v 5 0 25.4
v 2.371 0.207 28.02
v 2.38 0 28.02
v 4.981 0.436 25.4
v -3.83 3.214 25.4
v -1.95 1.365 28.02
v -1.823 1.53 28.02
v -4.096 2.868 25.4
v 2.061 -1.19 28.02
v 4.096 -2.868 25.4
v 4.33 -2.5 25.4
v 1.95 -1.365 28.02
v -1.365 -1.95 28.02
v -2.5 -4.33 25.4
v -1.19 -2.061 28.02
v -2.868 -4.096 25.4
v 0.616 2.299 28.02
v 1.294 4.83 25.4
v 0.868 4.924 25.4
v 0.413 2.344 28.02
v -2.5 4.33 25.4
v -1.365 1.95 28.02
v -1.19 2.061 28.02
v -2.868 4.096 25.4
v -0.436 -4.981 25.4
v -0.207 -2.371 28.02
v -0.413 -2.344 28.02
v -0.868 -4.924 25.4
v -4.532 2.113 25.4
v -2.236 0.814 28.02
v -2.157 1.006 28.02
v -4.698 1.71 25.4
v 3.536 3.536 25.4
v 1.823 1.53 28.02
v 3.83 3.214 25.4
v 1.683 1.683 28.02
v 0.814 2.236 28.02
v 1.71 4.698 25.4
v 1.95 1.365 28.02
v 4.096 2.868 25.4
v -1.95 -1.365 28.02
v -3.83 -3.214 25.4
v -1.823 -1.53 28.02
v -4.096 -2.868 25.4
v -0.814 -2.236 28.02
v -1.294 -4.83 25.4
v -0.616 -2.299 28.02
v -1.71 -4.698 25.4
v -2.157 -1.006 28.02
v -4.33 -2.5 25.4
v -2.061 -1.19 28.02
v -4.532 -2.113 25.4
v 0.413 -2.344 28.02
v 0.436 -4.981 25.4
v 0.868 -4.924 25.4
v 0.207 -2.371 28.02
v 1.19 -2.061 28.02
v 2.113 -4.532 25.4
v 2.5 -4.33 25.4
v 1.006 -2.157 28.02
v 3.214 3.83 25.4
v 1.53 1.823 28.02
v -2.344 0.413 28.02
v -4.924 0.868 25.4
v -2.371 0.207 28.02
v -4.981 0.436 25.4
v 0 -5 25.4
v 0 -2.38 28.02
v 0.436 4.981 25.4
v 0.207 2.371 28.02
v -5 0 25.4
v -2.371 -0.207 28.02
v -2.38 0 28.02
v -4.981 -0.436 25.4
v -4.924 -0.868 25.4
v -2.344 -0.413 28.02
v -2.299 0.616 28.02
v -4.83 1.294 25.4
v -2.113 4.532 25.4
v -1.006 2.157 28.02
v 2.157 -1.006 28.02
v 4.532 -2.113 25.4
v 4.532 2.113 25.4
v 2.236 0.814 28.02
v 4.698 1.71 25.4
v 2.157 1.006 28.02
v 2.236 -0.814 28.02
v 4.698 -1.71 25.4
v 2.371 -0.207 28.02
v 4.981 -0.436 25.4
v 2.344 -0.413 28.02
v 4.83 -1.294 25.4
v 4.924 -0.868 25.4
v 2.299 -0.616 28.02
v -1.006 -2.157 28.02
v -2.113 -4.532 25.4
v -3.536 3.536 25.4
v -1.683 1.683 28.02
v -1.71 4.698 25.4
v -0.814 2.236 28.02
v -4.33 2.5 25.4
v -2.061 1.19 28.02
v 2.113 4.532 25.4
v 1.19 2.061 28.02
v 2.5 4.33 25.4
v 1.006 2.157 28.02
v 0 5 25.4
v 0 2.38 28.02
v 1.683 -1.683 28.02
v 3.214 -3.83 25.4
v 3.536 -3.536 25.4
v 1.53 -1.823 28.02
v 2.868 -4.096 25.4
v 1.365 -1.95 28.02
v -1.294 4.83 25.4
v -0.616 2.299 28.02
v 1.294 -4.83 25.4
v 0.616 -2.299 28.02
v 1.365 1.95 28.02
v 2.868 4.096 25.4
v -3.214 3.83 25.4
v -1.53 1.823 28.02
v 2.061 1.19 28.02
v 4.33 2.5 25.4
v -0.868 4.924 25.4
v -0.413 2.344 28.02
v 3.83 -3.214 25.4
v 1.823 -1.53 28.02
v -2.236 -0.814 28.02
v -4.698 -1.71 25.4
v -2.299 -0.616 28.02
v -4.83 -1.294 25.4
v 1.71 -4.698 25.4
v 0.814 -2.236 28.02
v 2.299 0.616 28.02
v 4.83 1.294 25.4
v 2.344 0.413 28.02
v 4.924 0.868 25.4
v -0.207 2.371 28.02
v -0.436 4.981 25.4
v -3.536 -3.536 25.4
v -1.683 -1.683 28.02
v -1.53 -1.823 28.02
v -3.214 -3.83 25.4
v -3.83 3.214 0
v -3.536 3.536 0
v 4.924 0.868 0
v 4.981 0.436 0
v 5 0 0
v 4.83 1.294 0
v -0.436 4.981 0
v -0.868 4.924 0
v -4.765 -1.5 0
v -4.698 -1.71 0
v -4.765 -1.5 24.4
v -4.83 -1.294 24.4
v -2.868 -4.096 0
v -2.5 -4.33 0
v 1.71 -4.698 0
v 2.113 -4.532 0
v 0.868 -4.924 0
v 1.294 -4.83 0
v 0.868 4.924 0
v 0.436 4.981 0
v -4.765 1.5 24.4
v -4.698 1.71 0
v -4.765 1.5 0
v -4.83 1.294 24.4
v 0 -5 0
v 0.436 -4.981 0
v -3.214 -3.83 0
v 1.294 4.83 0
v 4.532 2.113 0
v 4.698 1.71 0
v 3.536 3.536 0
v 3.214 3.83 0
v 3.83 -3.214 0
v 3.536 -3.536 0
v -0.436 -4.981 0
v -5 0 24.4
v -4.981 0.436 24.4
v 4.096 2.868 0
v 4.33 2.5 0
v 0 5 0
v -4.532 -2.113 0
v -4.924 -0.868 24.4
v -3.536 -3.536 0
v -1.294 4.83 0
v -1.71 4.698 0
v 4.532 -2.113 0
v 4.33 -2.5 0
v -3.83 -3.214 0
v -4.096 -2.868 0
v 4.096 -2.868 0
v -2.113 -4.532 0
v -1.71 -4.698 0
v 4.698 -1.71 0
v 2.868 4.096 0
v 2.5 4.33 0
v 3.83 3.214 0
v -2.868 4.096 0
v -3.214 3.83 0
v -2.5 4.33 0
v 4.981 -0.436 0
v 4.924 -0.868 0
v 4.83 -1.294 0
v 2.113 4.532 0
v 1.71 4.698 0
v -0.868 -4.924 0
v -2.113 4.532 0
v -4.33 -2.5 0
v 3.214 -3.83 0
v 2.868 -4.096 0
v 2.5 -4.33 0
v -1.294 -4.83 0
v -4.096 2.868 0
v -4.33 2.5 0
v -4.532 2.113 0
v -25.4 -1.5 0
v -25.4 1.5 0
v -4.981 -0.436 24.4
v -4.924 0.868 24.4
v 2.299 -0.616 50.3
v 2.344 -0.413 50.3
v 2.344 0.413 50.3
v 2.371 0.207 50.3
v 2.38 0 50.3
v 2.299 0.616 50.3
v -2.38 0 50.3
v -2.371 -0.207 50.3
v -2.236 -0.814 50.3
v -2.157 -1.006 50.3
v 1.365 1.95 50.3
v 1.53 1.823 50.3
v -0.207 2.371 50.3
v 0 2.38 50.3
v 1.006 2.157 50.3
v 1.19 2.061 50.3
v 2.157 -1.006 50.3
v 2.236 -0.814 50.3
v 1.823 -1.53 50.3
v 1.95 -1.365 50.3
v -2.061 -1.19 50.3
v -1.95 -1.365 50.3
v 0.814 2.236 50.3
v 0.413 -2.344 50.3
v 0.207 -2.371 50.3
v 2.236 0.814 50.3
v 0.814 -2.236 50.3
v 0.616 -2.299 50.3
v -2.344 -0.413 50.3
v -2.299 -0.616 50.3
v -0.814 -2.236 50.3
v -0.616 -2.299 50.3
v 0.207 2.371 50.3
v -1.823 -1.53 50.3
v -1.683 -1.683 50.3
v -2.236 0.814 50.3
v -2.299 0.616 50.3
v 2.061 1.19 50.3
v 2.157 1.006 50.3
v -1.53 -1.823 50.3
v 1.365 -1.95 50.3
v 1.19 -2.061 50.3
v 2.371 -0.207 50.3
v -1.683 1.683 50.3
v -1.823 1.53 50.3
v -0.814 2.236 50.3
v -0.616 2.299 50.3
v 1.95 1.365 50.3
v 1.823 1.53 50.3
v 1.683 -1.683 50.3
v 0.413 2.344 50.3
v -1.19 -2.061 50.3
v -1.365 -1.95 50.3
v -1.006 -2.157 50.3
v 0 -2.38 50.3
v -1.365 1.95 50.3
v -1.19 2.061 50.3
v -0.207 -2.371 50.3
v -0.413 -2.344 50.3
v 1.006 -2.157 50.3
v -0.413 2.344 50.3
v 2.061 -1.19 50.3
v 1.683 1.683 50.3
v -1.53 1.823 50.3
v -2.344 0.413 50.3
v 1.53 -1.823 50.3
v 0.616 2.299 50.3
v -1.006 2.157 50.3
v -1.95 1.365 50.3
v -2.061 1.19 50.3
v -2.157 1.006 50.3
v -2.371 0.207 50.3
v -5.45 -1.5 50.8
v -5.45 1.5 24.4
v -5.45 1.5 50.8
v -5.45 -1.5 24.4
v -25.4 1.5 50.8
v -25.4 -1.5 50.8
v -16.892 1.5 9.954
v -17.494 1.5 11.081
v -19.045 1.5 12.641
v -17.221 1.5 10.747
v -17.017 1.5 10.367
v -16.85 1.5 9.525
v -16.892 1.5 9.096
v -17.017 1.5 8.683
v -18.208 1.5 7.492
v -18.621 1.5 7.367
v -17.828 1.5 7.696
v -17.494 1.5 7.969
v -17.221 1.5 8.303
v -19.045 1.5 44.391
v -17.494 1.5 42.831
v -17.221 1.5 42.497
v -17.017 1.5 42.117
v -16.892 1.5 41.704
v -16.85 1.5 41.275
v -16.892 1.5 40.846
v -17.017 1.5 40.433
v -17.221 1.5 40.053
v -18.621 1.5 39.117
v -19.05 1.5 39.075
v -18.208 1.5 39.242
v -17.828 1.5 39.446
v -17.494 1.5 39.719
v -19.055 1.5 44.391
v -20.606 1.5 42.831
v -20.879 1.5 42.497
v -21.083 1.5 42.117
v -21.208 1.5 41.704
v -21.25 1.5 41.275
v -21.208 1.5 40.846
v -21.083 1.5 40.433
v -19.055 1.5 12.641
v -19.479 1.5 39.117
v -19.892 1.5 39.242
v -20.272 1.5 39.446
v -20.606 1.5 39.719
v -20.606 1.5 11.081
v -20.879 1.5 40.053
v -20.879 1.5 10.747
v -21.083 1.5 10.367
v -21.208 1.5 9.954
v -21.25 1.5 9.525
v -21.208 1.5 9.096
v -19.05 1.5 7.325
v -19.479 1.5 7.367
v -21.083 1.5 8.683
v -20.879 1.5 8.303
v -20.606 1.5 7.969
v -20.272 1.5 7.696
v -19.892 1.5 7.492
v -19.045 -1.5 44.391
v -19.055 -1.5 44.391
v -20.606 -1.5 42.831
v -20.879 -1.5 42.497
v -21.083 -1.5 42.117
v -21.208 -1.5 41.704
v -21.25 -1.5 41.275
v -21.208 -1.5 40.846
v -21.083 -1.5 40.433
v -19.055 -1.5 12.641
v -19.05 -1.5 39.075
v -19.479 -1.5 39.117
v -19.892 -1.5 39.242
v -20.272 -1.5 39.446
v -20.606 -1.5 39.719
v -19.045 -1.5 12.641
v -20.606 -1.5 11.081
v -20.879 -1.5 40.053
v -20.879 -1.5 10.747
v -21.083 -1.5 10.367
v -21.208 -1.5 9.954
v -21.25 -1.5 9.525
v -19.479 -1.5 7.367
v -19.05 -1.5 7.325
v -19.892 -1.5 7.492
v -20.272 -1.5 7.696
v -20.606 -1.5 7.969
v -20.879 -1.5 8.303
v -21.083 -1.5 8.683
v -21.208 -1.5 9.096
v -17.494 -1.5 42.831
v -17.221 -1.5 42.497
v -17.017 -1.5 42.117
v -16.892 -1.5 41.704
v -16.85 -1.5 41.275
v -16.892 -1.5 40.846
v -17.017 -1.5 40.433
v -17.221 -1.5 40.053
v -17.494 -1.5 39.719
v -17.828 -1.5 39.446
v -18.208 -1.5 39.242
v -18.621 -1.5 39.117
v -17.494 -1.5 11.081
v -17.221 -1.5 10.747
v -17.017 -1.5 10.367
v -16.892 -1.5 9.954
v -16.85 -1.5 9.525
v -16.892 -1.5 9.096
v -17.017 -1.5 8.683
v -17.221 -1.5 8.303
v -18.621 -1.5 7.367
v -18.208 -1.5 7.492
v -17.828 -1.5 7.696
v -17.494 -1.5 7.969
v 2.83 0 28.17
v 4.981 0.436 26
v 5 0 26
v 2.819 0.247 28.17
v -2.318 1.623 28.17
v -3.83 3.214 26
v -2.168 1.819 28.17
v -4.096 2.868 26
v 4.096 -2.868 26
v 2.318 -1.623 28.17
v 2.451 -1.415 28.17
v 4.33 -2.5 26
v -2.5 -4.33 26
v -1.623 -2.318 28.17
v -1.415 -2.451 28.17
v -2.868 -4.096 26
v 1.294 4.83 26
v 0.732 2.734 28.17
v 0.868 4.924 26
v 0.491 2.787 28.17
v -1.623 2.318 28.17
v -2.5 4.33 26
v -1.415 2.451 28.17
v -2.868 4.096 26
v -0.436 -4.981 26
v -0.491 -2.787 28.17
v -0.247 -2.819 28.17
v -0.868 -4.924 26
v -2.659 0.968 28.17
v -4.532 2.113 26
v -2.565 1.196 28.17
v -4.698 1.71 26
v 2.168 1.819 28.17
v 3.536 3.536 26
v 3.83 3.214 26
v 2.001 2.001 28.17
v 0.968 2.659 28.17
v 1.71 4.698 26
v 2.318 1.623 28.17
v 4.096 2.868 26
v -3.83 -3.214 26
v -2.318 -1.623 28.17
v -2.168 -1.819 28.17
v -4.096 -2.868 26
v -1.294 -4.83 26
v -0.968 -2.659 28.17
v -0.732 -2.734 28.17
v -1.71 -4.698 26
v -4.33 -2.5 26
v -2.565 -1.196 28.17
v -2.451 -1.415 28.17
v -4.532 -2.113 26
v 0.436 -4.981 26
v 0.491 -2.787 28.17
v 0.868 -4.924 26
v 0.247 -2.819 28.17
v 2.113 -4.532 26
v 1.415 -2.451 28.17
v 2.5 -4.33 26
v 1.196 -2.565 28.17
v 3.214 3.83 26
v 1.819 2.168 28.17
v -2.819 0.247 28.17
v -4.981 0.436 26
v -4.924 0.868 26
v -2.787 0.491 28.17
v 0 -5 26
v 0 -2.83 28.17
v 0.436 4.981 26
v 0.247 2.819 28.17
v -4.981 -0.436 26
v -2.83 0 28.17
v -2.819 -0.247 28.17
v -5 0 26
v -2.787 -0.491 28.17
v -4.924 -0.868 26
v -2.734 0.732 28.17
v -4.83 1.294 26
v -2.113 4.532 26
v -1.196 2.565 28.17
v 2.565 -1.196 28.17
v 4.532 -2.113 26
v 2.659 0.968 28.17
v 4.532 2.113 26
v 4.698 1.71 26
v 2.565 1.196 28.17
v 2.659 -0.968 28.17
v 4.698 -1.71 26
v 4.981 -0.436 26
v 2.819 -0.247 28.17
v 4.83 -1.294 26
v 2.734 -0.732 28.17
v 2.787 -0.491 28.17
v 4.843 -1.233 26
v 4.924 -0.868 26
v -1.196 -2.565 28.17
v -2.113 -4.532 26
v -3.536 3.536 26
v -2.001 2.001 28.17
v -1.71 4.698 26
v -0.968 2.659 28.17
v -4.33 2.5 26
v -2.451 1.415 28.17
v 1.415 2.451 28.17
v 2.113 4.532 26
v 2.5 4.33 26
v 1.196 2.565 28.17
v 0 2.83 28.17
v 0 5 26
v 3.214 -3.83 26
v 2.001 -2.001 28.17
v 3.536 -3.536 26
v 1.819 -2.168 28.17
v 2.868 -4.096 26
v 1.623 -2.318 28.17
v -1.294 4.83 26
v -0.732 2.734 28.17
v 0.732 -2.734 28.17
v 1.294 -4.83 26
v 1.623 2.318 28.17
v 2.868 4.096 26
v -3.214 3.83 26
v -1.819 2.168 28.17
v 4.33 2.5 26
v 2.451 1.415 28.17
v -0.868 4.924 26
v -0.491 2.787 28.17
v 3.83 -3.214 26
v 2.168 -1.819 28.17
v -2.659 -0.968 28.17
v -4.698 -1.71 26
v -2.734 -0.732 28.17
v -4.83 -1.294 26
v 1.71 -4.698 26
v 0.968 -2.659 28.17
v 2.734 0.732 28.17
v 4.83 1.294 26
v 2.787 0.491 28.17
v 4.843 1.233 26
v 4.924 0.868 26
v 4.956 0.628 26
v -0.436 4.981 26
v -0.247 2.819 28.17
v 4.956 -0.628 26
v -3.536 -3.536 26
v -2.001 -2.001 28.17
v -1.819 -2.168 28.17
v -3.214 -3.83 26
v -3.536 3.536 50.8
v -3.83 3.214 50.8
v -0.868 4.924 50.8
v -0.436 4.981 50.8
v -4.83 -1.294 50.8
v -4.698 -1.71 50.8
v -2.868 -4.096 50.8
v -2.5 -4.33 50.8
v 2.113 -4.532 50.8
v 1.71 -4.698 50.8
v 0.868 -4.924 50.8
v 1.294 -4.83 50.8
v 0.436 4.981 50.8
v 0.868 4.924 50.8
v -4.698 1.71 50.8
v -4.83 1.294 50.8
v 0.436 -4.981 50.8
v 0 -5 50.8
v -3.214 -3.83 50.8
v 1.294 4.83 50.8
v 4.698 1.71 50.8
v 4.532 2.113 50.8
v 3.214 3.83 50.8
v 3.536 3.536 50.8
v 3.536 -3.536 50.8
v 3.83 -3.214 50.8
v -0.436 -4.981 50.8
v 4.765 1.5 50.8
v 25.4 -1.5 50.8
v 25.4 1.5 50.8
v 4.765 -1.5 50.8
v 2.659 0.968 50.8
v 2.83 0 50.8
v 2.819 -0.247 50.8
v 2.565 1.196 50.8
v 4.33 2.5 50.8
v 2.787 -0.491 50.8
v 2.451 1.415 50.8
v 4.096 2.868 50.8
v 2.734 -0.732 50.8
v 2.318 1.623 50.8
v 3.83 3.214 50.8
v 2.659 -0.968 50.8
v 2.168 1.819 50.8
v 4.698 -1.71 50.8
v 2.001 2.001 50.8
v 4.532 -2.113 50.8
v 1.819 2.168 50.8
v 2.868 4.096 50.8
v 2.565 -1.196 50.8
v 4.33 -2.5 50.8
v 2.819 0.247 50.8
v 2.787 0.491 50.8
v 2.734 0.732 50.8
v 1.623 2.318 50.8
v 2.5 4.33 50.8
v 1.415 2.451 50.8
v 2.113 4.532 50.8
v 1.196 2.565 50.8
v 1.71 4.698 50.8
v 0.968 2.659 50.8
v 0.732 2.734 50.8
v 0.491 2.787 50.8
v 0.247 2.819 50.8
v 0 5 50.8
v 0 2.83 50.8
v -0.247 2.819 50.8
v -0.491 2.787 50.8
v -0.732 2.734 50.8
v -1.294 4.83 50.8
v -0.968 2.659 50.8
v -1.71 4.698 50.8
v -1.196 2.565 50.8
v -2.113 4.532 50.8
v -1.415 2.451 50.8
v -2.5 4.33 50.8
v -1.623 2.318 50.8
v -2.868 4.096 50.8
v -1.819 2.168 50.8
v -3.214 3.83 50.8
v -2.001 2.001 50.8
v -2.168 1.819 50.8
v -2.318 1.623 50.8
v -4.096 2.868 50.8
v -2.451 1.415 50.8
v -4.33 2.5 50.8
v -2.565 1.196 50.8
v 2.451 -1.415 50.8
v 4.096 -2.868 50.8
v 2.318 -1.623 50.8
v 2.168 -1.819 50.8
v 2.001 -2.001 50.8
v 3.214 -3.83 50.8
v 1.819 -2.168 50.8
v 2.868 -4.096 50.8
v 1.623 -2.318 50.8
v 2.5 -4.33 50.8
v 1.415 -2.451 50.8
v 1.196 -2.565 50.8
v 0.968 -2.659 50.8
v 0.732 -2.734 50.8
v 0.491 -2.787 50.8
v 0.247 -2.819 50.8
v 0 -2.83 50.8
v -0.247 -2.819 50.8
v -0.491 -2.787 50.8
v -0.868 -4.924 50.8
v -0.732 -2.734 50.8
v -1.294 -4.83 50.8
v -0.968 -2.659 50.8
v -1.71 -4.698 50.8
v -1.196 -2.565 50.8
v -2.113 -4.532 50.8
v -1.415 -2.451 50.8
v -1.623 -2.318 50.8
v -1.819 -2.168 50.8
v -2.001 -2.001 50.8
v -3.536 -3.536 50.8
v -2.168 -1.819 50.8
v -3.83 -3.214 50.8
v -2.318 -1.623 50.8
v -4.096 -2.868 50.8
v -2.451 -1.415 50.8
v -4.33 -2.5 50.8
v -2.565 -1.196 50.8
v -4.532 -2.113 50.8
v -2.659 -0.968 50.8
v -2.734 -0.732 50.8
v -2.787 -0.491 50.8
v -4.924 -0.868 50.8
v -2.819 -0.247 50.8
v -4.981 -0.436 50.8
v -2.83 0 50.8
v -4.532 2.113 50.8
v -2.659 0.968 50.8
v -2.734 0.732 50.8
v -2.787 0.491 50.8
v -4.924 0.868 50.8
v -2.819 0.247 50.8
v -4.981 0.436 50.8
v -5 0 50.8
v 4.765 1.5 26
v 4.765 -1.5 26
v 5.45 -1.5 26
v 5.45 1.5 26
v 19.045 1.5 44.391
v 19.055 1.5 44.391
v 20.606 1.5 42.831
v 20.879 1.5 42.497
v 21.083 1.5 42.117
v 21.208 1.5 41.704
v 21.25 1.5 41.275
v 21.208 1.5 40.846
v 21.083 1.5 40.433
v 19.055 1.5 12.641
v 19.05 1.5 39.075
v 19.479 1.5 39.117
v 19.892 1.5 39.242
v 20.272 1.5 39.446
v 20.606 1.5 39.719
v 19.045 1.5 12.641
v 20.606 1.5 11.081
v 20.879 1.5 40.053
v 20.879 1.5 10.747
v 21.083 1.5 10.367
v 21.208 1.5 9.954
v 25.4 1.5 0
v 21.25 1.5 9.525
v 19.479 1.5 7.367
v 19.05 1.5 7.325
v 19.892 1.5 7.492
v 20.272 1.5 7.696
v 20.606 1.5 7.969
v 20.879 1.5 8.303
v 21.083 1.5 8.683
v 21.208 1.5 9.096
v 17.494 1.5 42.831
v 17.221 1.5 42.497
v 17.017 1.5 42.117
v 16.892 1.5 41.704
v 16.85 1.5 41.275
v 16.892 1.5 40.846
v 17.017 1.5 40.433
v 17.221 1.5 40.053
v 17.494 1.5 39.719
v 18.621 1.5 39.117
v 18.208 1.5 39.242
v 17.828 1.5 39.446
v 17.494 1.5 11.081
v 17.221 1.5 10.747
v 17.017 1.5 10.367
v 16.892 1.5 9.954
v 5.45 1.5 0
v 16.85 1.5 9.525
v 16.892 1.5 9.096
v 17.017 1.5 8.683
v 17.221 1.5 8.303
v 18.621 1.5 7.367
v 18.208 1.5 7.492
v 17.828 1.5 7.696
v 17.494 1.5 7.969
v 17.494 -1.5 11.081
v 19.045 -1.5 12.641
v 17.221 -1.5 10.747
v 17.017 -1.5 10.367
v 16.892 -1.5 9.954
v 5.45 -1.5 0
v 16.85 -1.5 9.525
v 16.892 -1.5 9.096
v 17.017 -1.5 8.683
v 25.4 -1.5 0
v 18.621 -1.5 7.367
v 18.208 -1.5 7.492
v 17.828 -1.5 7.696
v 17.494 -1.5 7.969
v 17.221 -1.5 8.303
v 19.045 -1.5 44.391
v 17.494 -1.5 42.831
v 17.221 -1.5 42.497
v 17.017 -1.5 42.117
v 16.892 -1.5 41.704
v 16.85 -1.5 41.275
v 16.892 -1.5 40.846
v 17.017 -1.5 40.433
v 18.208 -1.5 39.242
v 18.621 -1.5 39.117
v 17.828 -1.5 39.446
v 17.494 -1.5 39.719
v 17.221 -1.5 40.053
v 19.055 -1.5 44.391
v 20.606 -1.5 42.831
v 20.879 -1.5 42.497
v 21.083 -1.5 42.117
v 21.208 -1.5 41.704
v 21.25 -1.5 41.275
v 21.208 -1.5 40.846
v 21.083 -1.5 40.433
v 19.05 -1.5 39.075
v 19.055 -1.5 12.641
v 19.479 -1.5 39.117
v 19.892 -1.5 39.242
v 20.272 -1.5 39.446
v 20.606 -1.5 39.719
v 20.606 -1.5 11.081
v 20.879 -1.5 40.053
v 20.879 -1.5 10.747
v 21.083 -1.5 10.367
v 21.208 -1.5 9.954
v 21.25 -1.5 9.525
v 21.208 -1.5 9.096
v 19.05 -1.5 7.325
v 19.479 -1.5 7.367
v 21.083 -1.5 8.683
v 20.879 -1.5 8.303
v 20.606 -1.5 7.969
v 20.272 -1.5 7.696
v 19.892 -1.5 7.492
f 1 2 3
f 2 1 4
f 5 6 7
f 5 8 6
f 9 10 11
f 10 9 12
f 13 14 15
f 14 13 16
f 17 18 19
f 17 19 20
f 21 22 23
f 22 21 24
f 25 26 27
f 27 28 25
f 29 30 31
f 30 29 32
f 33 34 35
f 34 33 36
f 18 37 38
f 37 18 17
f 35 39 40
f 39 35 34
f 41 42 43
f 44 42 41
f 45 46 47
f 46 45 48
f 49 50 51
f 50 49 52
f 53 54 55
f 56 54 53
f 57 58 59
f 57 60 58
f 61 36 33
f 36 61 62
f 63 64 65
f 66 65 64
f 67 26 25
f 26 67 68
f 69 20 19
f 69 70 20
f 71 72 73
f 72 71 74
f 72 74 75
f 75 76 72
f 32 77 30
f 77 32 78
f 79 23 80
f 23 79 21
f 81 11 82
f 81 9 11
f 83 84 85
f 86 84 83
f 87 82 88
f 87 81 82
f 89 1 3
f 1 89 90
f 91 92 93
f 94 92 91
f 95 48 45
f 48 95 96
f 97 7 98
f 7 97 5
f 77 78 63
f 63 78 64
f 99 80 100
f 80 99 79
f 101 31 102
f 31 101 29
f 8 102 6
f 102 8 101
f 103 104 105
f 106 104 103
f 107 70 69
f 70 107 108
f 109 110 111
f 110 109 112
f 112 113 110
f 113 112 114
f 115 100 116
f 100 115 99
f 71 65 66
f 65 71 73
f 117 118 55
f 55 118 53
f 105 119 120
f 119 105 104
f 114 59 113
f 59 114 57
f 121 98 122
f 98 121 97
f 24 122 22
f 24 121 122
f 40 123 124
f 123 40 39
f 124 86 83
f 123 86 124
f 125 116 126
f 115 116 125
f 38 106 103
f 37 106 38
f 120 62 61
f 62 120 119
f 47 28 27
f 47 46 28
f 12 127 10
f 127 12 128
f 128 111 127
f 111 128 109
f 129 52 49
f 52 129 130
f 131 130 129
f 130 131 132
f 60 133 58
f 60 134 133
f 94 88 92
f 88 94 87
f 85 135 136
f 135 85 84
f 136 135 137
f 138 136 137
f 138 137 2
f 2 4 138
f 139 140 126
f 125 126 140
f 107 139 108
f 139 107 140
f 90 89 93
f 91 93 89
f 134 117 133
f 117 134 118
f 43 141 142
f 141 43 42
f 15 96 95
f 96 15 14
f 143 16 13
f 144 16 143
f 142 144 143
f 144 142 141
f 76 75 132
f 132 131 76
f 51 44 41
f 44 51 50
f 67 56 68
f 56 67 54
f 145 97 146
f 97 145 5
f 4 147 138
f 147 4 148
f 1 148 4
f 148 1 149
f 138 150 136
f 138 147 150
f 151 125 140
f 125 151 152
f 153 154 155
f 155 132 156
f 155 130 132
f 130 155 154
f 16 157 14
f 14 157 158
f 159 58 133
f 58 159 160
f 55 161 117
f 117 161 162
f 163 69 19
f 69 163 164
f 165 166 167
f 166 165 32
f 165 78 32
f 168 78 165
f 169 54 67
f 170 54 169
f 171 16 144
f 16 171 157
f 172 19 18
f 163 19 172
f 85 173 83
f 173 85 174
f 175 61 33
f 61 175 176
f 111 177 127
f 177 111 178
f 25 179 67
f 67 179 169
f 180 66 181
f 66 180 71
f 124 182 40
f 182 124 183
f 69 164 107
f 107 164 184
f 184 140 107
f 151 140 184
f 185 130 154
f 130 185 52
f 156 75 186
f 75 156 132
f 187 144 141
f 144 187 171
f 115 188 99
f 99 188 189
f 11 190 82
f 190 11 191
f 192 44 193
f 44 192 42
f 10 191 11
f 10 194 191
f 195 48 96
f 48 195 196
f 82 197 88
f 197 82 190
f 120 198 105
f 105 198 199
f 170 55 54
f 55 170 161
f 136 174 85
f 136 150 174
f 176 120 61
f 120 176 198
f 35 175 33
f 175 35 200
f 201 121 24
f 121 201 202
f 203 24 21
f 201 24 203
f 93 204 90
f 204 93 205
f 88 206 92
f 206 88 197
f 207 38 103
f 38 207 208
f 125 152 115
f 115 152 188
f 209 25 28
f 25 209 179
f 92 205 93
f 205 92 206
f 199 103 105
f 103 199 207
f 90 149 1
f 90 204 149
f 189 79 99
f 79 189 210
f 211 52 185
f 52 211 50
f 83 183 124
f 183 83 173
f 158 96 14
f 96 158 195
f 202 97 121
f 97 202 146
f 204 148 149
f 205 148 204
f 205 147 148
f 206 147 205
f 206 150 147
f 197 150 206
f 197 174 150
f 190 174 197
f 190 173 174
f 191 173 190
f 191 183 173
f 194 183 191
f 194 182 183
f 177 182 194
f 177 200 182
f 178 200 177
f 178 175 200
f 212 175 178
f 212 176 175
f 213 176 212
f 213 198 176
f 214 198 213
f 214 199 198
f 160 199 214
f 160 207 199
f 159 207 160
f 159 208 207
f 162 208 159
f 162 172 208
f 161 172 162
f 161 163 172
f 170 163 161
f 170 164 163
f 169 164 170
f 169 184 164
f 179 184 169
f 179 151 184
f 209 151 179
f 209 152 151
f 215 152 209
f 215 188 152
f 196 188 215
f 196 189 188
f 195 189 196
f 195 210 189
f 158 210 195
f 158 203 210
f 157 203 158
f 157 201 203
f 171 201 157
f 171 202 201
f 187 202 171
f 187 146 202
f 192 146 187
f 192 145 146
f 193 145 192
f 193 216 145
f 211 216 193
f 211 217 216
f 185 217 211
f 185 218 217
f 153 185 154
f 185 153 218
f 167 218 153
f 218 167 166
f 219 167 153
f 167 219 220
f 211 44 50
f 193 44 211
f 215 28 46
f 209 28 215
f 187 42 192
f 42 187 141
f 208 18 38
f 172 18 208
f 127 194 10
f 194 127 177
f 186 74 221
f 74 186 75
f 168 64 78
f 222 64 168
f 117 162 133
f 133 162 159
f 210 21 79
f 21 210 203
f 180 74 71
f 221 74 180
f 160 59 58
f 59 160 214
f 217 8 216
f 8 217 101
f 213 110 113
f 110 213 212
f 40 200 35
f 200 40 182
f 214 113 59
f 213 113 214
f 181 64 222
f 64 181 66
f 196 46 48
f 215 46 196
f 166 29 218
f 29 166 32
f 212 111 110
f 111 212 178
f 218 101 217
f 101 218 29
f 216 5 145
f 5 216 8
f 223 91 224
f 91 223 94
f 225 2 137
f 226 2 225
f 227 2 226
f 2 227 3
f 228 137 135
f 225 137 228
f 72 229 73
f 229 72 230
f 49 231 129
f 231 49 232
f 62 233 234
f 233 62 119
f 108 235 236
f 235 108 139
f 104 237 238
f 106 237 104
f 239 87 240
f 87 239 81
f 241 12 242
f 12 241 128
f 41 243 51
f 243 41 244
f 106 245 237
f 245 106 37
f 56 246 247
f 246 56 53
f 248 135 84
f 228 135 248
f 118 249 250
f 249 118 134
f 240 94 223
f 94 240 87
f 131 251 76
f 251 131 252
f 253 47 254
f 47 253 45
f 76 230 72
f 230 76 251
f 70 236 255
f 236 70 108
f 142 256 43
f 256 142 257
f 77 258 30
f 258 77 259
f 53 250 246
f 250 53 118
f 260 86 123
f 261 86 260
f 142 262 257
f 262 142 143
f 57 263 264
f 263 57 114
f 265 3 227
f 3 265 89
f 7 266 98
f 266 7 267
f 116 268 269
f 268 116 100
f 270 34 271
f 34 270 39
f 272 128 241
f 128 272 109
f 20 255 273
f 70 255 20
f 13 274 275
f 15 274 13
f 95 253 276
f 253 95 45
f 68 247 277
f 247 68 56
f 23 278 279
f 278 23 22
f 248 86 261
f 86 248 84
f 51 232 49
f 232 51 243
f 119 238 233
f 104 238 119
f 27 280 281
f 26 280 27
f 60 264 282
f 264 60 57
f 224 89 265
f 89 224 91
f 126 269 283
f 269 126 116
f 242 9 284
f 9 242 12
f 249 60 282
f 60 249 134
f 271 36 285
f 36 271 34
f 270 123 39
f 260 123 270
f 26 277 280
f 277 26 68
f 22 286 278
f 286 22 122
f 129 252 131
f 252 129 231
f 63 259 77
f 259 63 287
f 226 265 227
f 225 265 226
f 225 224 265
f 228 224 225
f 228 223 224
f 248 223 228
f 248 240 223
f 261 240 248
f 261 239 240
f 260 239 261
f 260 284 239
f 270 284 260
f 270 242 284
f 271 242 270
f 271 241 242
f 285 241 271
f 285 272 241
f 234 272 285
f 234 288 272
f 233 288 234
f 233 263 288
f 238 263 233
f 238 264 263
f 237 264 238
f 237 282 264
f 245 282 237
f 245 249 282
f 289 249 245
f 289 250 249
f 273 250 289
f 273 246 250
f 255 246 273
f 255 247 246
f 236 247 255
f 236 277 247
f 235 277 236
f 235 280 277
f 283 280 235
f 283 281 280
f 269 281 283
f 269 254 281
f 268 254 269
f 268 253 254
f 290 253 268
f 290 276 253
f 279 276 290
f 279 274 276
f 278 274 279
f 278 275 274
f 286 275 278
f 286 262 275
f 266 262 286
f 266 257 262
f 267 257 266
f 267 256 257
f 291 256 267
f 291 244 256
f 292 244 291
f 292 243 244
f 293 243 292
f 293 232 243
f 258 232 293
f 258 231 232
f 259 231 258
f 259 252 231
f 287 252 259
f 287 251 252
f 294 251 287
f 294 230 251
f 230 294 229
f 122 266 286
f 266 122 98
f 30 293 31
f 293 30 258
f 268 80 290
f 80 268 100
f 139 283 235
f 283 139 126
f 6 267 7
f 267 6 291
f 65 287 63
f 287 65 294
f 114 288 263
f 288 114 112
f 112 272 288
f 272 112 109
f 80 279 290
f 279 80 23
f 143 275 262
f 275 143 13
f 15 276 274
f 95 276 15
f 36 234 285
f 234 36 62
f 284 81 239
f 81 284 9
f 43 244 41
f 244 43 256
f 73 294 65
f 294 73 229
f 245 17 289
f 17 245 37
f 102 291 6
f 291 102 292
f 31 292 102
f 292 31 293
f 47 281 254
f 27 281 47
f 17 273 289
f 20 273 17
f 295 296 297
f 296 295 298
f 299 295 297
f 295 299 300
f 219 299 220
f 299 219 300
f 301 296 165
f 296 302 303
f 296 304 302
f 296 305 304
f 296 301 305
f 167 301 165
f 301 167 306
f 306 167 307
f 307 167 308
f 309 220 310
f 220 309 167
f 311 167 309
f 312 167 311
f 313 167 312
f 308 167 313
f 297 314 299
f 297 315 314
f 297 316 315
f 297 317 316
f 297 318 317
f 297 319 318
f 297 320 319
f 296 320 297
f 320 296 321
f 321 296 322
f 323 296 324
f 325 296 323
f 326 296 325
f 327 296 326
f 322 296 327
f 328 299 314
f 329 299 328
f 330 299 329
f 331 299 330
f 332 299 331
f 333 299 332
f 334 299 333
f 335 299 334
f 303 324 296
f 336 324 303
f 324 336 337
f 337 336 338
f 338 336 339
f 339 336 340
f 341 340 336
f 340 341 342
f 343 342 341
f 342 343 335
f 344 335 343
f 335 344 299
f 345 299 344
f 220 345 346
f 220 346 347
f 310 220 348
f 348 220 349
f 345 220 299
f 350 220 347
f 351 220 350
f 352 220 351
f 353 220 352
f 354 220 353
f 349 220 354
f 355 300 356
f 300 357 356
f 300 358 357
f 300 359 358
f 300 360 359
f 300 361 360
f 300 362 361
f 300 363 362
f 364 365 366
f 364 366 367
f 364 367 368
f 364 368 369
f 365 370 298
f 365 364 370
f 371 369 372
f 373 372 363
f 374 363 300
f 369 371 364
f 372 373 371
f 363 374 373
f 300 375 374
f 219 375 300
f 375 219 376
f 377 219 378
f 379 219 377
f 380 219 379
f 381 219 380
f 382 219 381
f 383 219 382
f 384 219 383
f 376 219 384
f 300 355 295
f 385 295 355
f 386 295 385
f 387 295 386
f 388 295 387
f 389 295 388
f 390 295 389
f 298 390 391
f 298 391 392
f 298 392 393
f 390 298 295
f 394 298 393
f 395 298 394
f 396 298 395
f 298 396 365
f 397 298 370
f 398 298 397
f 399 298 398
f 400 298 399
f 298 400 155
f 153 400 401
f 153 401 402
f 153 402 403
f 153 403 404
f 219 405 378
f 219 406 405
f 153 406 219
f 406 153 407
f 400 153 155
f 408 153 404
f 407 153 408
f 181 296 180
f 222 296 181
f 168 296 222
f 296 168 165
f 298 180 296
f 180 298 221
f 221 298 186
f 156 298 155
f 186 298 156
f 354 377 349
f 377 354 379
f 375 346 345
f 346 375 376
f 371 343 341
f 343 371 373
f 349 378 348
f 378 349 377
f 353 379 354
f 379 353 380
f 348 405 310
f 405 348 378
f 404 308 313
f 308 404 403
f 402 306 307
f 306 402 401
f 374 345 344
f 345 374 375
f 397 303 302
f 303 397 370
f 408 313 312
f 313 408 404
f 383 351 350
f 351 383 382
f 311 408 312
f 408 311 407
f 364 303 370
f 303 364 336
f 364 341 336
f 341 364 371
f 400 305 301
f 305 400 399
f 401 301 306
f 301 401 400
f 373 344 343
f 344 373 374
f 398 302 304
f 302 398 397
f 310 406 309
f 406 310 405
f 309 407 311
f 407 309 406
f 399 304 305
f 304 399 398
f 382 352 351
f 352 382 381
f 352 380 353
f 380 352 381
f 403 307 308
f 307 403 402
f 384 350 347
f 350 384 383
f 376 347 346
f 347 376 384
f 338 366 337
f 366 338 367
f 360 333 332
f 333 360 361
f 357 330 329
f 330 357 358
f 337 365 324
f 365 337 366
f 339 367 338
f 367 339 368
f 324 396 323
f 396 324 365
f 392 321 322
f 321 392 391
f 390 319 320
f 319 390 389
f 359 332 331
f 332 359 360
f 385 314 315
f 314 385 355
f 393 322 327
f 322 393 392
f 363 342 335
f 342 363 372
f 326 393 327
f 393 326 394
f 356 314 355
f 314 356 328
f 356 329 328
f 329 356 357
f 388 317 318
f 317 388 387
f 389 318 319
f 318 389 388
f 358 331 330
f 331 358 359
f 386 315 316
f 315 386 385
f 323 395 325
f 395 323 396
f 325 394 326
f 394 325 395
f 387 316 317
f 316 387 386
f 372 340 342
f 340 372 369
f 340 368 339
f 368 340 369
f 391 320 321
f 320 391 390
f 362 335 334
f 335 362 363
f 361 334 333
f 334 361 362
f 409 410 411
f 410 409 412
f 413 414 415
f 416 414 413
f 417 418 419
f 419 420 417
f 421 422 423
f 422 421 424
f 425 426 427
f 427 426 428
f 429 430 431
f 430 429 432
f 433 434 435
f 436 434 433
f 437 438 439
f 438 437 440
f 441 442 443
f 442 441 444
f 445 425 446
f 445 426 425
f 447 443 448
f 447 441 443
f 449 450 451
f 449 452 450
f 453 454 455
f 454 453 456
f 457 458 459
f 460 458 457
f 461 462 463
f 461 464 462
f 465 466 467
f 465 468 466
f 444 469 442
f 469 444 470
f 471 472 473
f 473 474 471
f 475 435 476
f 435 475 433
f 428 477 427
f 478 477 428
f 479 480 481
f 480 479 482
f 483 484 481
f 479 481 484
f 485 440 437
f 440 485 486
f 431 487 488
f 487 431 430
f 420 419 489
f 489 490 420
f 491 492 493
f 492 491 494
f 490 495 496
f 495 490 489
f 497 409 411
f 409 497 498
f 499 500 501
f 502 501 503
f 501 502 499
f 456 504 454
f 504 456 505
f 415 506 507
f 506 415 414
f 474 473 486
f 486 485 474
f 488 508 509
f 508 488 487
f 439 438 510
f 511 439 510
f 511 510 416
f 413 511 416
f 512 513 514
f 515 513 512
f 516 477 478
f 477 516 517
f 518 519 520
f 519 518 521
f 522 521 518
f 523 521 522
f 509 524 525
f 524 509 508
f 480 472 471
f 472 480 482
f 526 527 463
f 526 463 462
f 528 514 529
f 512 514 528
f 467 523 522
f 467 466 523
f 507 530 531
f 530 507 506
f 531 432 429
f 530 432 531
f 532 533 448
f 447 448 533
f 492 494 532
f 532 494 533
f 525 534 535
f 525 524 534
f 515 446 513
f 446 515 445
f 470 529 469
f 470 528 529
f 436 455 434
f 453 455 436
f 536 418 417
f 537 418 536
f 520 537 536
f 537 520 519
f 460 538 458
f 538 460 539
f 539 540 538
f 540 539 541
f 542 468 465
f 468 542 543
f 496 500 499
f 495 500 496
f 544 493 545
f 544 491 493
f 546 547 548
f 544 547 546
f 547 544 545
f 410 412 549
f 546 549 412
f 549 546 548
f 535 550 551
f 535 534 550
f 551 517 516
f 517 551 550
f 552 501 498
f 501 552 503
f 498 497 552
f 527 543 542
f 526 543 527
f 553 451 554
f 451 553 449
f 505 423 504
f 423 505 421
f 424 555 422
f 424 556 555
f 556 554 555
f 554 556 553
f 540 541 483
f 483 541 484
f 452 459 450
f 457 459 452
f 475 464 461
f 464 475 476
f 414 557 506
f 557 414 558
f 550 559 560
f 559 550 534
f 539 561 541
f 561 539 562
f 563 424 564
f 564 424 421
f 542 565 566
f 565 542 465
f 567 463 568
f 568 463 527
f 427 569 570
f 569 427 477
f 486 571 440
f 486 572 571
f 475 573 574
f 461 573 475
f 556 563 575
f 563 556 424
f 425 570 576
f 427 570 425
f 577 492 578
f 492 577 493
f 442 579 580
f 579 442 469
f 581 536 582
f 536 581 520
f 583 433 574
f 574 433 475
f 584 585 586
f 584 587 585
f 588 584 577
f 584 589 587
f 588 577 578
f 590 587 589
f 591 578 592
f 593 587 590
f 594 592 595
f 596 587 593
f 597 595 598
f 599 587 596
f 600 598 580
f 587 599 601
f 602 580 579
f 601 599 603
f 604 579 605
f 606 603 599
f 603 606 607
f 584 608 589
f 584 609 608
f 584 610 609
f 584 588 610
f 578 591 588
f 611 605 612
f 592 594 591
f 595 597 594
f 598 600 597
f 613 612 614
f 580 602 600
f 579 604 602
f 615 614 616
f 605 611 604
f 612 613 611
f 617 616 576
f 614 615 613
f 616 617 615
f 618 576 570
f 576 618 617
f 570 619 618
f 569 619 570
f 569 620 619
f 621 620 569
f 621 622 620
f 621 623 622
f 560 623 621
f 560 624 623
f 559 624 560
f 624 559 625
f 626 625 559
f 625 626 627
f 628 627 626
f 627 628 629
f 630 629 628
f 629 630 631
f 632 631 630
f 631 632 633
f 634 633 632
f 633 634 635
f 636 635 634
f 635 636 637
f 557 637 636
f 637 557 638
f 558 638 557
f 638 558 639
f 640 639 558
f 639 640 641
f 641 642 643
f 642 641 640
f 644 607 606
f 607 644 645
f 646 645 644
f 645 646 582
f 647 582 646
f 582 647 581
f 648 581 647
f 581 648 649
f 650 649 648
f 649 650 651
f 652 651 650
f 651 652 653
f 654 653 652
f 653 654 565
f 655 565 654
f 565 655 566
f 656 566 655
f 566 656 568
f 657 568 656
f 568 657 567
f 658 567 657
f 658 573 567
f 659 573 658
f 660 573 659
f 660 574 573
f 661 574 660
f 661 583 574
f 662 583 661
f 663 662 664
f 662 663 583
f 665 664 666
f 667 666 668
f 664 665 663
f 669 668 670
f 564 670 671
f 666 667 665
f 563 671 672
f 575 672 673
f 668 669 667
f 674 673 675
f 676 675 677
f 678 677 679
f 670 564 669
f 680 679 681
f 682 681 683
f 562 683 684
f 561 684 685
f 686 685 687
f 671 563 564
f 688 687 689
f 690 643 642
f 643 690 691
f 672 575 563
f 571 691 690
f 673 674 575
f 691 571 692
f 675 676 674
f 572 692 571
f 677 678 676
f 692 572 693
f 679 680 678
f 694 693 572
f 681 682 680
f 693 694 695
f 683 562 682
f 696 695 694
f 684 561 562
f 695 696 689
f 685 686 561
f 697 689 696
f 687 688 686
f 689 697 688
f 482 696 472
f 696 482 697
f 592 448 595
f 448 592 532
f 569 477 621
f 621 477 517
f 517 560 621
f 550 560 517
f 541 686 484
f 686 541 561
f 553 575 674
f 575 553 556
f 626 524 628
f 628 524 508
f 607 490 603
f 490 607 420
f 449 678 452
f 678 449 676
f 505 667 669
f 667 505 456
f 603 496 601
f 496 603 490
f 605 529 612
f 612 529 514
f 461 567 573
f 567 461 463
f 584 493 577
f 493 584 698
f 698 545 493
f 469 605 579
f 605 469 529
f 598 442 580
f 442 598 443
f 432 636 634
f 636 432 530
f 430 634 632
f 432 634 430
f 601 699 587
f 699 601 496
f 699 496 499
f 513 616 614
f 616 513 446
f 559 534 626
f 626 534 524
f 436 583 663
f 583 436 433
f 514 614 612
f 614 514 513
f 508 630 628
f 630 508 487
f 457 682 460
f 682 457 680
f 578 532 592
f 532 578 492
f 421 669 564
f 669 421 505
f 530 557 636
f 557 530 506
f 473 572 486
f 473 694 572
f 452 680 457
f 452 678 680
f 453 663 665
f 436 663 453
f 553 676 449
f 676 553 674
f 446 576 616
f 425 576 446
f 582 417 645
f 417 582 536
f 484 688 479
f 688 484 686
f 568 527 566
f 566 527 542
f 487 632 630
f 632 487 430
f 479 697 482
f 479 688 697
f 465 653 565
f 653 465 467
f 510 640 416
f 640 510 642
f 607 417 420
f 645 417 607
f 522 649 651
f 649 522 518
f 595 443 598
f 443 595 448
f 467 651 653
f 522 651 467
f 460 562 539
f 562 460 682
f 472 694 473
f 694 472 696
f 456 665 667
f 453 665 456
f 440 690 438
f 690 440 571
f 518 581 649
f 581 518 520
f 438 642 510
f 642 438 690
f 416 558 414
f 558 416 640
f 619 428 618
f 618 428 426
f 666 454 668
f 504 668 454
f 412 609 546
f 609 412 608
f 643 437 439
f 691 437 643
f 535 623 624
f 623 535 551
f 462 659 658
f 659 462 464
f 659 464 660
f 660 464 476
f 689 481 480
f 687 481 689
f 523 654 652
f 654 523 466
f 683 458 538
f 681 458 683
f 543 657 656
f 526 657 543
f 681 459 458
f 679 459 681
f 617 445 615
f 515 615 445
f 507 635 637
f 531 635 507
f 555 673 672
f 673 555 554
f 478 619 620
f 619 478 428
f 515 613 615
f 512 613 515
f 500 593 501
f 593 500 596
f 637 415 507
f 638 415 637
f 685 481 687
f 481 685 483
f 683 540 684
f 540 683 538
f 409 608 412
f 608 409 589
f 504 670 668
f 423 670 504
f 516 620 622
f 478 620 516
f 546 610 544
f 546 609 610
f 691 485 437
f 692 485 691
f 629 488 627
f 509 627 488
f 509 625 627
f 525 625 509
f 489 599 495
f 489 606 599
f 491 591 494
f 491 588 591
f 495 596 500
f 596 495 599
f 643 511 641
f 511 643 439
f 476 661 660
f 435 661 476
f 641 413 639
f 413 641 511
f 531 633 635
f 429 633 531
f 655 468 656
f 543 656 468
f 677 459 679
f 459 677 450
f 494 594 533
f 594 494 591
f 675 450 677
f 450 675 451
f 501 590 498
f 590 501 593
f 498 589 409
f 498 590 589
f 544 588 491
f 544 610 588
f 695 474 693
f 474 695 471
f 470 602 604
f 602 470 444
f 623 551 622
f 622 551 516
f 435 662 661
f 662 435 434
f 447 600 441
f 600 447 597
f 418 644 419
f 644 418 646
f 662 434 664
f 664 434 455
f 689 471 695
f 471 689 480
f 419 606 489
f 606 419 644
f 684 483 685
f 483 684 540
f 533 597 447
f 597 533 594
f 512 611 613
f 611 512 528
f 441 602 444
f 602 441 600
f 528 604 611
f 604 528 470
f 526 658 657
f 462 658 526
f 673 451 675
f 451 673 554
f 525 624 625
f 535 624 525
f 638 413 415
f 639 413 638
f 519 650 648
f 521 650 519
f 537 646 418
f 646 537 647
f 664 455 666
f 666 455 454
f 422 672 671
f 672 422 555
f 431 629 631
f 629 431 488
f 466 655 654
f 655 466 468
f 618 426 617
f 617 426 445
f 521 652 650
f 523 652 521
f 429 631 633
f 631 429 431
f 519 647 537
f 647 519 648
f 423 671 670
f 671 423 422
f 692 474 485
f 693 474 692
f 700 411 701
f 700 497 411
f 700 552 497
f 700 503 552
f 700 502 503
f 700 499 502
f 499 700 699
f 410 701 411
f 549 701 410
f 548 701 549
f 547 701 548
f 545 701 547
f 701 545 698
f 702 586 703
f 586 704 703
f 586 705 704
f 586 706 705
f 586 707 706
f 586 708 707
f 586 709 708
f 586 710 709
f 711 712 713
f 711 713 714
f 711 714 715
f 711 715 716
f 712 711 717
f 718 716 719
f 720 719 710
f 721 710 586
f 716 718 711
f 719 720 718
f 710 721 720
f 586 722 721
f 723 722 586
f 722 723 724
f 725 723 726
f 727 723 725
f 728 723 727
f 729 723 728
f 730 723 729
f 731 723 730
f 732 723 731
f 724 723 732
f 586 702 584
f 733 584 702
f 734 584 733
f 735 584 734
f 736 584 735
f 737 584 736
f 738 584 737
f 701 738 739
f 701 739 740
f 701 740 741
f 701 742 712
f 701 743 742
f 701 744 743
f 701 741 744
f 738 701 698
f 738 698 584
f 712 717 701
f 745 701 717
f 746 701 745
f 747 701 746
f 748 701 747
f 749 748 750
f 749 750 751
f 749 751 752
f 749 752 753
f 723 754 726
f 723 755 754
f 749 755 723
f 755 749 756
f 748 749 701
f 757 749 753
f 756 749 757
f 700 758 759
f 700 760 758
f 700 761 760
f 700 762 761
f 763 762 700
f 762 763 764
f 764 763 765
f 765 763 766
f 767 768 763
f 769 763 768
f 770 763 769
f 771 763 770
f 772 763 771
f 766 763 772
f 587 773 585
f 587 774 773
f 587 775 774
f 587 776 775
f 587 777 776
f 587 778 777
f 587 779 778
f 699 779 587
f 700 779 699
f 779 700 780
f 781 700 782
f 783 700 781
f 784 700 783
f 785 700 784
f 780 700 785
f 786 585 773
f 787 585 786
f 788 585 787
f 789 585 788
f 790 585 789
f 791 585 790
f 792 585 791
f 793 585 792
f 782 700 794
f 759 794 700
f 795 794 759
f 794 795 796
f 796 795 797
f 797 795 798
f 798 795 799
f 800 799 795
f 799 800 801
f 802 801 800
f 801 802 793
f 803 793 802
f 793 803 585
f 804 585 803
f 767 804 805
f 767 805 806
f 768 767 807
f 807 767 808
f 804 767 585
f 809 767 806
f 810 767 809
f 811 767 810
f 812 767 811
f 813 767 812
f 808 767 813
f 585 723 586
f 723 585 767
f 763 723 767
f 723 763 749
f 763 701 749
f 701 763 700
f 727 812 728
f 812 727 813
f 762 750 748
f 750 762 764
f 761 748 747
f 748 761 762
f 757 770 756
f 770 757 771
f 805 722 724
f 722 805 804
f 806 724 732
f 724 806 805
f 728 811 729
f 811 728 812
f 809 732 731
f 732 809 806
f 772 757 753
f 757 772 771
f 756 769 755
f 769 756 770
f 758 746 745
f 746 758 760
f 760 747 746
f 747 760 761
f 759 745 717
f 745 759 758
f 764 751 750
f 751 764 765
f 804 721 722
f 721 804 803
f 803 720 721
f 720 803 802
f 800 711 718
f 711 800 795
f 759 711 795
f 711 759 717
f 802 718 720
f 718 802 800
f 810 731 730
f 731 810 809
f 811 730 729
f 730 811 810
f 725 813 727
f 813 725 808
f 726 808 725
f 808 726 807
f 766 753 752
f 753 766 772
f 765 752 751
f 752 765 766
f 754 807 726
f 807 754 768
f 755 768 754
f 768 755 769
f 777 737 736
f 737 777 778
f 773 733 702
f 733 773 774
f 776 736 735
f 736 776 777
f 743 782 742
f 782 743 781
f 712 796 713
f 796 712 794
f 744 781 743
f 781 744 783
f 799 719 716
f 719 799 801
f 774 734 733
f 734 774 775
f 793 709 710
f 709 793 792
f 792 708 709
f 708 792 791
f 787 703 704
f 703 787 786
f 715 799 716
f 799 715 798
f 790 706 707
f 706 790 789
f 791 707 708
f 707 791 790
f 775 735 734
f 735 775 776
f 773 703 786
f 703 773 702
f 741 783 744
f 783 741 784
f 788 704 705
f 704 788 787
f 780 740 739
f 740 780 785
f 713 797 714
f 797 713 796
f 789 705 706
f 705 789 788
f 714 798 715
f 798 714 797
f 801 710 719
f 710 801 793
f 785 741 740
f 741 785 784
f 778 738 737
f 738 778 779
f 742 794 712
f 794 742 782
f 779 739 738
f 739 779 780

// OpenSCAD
// Lift-off hinge printed assembled, knuckle axis vertical. The lower knuckle
// ends in a 45 degree cone and the upper knuckle's underside is the same cone
// raised by the clearance, so nothing prints over air.
hinge_length = 50.8;
leaf_width = 25.4;      // axis to leaf edge
clearance = 0.6;        // vertical offset of the cone interface (0.42 normal to it)
pin_d = 4.76;
pin_gap = 0.45;         // radial gap round the pin
side_gap = 0.45;        // leaf plate to the other knuckle
knuckle_r = 5;
thickness = 3;
hole_d = 4.4;
hole_x = 19.05;
hole_z = [9.525, 41.275];
$fn = 72;

split = hinge_length/2;
t = thickness;

module teardrop_y(d, len) {
    rotate([90, 0, 0]) linear_extrude(len, center = true)
        hull() {
            circle(d = d, $fn = 32);
            translate([0, d/2*sqrt(2)]) square(0.01, center = true);
        }
}

// solid below the interface cone (apex up), raised by dz
module below_cone(dz) {
    translate([0, 0, -1]) cylinder(r = knuckle_r + 2, h = split + dz + 1 - 2);
    translate([0, 0, split + dz - 2]) cylinder(r1 = knuckle_r + 2, r2 = 0, h = knuckle_r + 2);
}

module plate(x0, x1, z0, z1) {
    translate([x0, -t/2, z0]) cube([x1 - x0, t, z1 - z0]);
}

module holes(s) {
    for (z = hole_z) translate([s*hole_x, 0, z]) teardrop_y(hole_d, t + 2);
}

// pin leaf: lower knuckle, pin, plate along -X
difference() {
    union() {
        intersection() {
            cylinder(r = knuckle_r, h = hinge_length);
            below_cone(0);
        }
        cylinder(d = pin_d, h = hinge_length - 0.5);
        plate(-leaf_width, -knuckle_r - side_gap, 0, hinge_length);
        plate(-knuckle_r - side_gap - 0.1, -knuckle_r + 1, 0, split - 1);
    }
    holes(-1);
}

// lifting leaf: upper knuckle, plate along +X
difference() {
    union() {
        difference() {
            cylinder(r = knuckle_r, h = hinge_length);
            below_cone(clearance);
            translate([0, 0, -1]) cylinder(d = pin_d + 2*pin_gap, h = hinge_length + 2);
        }
        plate(knuckle_r + side_gap, leaf_width, 0, hinge_length);
        difference() {
            plate(knuckle_r - 1, knuckle_r + side_gap + 0.1, split + clearance, hinge_length);
            below_cone(clearance);
        }
    }
    holes(1);
}
